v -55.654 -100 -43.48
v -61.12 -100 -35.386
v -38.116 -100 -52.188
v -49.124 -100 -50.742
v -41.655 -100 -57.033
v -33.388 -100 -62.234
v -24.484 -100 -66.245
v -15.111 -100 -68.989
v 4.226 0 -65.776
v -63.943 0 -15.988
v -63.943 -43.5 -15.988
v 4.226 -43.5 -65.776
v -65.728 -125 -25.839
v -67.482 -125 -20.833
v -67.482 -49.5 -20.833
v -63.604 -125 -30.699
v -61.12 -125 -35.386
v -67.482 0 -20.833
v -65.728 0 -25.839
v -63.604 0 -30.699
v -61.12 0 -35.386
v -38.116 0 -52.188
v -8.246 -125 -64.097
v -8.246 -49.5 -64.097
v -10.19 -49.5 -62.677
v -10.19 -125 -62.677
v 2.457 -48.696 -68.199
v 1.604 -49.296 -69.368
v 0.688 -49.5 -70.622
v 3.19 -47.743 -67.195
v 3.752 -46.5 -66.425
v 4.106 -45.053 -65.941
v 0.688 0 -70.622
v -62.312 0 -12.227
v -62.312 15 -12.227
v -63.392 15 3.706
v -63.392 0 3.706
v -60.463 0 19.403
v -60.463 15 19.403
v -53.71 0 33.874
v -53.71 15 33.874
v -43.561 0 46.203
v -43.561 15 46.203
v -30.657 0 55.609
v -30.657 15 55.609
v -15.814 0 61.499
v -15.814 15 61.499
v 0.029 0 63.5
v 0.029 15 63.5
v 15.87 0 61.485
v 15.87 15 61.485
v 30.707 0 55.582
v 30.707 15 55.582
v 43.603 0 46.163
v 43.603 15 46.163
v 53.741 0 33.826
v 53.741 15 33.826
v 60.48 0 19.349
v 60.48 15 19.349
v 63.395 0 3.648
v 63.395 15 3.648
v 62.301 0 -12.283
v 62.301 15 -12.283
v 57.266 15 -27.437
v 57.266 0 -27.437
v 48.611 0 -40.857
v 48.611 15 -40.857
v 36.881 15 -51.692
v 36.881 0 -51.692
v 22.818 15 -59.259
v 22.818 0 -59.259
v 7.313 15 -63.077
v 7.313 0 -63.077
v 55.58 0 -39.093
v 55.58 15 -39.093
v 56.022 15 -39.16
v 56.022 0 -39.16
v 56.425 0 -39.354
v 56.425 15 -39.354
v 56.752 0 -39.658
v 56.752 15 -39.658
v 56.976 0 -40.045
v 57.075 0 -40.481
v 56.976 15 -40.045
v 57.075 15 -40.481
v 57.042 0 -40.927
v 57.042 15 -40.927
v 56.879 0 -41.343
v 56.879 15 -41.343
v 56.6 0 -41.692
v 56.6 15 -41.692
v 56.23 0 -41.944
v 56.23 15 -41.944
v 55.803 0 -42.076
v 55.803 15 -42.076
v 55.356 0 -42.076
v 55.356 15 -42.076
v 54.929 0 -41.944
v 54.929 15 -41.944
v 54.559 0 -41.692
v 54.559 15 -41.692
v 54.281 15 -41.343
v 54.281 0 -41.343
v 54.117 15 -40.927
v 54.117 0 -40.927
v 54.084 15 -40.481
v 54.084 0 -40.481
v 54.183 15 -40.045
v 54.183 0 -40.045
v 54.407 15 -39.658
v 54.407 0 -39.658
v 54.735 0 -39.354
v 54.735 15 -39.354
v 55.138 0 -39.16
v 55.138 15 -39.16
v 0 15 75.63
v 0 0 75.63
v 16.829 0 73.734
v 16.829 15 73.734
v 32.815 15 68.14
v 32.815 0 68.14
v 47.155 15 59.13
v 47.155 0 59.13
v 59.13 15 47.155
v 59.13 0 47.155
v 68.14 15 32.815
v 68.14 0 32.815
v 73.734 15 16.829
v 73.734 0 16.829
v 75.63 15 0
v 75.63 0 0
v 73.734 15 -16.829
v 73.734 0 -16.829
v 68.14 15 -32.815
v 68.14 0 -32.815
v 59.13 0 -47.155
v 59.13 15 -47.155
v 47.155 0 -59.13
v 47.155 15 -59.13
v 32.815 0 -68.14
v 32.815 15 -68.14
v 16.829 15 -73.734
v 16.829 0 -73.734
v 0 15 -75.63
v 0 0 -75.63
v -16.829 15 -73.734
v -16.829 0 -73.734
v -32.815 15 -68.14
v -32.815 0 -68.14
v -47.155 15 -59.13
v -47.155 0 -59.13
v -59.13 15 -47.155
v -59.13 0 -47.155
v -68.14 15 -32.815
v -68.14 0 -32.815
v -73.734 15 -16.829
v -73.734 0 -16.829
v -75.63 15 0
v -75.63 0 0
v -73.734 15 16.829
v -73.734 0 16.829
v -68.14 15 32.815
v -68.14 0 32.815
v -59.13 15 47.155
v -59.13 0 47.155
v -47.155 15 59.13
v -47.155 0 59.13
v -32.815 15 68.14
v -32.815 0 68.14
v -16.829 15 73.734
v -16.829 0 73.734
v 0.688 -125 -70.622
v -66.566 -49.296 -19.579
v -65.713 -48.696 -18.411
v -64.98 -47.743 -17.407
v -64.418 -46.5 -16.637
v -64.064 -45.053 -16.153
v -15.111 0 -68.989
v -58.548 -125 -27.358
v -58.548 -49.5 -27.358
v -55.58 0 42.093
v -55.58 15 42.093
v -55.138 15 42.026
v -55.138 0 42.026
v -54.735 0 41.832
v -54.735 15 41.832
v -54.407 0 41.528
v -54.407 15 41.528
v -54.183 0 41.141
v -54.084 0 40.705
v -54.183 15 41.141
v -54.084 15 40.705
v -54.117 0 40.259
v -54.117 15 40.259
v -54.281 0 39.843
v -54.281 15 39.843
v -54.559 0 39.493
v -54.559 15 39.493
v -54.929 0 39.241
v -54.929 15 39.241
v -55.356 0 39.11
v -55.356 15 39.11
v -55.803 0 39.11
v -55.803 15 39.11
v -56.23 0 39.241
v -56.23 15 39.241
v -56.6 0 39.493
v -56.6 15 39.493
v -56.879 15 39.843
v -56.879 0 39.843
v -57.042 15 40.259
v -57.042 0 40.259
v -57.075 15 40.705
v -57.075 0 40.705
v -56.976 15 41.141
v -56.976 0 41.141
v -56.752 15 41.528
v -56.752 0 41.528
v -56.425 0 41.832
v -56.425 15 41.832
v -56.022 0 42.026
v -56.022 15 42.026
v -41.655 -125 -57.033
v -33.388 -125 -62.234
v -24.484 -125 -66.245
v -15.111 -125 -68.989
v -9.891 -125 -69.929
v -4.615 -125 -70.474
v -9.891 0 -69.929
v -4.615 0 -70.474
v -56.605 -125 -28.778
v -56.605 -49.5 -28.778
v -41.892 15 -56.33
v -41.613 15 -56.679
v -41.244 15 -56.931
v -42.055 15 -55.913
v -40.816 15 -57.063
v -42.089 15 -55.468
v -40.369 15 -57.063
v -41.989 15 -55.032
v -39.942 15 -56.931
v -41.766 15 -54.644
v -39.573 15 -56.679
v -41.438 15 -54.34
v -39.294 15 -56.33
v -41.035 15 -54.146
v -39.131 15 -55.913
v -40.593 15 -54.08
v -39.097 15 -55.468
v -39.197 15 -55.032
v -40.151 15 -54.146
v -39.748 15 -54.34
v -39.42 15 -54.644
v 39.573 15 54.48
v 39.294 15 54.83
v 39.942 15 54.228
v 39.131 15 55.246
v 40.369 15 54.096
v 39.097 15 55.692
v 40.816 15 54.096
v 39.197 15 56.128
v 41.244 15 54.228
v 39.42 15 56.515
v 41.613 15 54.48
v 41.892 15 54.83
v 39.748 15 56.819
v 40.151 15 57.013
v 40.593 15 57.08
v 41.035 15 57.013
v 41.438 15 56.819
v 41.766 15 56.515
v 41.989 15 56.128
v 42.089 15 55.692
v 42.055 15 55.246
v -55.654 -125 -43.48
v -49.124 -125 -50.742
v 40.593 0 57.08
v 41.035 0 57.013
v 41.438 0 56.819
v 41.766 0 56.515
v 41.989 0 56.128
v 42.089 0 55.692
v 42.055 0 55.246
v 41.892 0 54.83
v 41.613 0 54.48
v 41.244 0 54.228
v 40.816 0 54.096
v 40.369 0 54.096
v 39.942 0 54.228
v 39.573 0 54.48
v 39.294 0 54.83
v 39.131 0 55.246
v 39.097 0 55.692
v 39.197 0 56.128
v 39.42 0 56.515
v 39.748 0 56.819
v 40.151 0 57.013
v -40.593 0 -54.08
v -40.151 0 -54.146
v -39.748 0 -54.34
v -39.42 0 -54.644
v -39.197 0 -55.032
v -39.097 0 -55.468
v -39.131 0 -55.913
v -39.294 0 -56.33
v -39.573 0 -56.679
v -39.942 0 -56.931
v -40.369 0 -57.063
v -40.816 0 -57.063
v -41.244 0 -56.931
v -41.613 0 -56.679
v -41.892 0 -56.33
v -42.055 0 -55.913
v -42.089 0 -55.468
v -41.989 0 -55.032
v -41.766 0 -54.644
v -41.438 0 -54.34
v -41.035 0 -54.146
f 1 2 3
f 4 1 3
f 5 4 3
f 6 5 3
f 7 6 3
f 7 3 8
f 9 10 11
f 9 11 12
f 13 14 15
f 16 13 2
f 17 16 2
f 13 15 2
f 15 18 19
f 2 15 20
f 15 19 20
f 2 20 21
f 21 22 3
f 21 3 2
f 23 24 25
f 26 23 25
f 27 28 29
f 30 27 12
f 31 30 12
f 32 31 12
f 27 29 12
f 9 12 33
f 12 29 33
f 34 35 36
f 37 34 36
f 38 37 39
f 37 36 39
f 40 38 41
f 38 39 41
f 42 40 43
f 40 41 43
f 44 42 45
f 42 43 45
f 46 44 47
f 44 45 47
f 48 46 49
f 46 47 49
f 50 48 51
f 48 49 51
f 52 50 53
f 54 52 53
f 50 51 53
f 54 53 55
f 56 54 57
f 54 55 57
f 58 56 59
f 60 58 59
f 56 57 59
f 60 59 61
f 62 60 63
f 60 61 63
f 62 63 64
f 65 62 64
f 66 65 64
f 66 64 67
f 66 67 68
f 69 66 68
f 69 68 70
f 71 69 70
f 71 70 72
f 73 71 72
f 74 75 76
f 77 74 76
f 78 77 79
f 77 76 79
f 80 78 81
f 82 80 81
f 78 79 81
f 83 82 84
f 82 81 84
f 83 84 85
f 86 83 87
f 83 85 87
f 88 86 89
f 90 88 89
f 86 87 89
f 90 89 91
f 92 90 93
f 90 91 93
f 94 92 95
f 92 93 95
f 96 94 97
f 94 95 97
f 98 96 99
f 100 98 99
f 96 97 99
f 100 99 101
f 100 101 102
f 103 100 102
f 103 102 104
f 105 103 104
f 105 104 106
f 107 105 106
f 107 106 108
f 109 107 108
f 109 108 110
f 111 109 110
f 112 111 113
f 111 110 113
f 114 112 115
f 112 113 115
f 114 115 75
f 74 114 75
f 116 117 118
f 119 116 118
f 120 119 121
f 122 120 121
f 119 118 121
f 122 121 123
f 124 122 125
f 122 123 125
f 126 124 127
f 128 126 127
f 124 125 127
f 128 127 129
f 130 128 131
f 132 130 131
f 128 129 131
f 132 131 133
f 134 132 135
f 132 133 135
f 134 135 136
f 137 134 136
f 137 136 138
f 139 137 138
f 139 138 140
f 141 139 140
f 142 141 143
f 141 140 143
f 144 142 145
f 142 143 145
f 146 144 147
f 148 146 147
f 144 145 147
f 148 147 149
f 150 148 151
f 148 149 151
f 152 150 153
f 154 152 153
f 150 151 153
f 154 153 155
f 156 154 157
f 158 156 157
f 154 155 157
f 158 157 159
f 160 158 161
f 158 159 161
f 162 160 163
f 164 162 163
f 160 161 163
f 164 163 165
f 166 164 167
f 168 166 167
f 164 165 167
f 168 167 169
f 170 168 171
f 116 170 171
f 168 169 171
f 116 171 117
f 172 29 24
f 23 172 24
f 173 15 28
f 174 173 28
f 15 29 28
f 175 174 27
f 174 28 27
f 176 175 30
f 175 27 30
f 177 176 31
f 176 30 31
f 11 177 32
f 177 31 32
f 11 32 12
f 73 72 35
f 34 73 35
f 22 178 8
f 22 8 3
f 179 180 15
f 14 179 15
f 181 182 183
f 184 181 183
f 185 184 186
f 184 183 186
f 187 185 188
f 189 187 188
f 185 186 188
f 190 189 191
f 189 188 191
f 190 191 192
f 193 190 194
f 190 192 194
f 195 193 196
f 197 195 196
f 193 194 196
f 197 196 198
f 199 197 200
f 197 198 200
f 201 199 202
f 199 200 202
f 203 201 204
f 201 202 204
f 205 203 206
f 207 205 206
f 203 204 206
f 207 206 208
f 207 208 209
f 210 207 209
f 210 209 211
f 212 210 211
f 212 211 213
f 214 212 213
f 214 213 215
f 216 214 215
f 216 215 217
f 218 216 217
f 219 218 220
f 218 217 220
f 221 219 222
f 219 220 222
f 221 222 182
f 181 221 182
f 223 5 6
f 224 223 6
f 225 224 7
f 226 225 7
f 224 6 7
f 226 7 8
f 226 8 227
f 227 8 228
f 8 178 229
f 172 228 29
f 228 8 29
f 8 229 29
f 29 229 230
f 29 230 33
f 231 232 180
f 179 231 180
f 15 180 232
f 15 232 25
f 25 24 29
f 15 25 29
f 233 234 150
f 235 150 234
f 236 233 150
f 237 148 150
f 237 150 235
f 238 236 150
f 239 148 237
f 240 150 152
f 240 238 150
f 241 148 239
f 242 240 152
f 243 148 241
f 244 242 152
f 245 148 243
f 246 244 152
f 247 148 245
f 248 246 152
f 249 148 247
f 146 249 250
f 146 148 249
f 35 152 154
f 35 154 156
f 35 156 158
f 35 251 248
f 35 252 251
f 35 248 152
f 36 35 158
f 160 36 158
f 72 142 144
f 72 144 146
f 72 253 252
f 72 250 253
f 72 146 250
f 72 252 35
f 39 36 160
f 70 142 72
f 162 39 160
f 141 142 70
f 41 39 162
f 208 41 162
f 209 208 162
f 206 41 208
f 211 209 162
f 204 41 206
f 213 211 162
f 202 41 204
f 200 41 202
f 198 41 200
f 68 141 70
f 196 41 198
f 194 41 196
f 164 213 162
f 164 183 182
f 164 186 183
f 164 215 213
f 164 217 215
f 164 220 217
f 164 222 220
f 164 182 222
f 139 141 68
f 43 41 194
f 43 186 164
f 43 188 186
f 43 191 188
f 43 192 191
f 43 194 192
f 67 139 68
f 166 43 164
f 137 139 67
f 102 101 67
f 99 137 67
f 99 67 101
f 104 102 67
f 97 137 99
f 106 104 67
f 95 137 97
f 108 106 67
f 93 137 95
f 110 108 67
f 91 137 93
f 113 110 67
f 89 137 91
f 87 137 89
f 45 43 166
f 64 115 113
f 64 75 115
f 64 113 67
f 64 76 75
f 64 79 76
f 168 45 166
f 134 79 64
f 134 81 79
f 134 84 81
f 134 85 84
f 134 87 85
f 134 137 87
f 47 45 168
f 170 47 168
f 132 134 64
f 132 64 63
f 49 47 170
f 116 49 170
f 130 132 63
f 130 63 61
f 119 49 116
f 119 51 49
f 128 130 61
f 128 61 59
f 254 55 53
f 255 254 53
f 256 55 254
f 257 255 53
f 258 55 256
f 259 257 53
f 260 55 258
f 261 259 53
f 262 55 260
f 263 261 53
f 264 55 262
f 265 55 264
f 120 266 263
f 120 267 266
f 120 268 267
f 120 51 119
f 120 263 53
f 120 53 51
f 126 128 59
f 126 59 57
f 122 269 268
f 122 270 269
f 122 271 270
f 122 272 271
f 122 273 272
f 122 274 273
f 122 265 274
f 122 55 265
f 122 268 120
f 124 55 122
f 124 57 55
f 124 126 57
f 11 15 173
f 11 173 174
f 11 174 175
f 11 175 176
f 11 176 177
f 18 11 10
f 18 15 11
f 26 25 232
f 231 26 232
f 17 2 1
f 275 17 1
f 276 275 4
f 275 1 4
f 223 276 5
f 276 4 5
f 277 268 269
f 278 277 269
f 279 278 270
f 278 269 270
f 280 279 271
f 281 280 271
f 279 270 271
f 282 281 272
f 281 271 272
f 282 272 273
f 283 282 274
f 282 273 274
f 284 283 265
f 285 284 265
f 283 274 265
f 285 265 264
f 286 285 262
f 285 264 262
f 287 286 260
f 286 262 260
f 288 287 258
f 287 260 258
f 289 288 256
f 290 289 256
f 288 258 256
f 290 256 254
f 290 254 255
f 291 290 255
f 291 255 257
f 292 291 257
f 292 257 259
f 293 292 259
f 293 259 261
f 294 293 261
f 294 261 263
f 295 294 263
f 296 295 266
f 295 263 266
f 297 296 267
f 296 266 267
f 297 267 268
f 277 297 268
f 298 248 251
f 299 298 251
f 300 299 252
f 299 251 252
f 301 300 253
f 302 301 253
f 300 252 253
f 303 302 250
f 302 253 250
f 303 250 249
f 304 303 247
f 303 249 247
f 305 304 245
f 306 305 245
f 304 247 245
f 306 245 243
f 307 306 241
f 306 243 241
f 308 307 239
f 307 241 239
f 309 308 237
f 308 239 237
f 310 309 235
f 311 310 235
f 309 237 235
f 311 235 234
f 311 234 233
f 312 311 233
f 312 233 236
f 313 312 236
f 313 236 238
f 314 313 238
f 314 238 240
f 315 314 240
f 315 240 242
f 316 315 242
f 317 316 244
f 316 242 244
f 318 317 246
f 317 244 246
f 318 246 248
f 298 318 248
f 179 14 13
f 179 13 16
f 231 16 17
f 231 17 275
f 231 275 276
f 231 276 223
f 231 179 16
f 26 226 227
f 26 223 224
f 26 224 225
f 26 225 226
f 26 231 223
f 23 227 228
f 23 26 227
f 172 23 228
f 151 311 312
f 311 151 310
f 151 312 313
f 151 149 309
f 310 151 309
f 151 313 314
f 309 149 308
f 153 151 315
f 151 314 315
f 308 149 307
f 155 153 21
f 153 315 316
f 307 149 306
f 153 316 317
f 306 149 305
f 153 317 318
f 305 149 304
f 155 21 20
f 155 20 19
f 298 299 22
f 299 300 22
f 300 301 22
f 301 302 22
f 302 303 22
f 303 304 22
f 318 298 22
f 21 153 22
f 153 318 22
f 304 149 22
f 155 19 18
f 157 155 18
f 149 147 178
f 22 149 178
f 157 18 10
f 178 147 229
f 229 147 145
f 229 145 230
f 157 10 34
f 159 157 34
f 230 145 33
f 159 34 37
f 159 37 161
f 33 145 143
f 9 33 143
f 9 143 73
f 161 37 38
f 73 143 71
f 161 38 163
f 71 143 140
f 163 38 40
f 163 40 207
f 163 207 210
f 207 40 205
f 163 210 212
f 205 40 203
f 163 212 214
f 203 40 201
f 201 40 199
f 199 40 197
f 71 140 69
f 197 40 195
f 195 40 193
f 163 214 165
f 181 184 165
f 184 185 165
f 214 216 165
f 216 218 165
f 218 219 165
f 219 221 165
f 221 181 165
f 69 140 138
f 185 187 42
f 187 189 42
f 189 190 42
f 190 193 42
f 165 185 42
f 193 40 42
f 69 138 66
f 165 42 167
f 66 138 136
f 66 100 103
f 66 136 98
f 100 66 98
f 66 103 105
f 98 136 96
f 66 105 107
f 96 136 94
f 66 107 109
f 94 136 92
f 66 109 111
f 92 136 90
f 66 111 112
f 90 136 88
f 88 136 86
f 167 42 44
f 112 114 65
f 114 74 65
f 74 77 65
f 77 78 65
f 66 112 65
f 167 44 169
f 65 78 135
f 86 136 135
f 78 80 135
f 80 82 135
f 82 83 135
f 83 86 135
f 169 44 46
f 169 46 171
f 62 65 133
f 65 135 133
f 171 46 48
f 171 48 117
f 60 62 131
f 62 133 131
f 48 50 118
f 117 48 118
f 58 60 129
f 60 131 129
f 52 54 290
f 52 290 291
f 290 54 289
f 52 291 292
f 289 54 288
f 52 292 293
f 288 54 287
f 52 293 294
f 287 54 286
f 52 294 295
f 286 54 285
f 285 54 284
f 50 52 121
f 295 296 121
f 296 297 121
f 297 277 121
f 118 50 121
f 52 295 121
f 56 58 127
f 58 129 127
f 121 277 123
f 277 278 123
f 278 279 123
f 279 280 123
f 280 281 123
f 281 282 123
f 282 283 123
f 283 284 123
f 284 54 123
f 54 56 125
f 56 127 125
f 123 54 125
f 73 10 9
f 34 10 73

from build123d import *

# Parameters (mm, degrees)
SKETCH2_R           = 75.63
BOSS_EXTRUDE1_DEPTH = 15
SKETCH5_R           = 63.5
CUT_EXTRUDE1_DEPTH  = 109.003674937
BOSS_EXTRUDE2_START = -15
BOSS_EXTRUDE2_DEPTH = 15
BOSS_EXTRUDE3_DEPTH = 125
CUT_EXTRUDE4_DEPTH  = 100
SKETCH7_R           = 1.5
CUT_EXTRUDE2_DEPTH  = 15
SKETCH8_W           = 84.415638362
SKETCH8_H           = 49.5
BOSS_EXTRUDE4_DEPTH = 6
FILLET1_R           = 6


with BuildPart() as part:
    # Sketch2 → Boss-Extrude1 (new body)
    with BuildSketch(Plane(origin=(0, 0, 0), x_dir=(1, 0, 0), z_dir=(0, 1, 0))):
        with Locations(Location((0, 0, 0), (0, 0, 270))):
            Circle(SKETCH2_R)
    extrude(amount=BOSS_EXTRUDE1_DEPTH)

    # Sketch5 → Cut-Extrude1 (cut, through all)
    with BuildSketch(Plane(origin=(0, 15, 0), x_dir=(1, 0, 0), z_dir=(0, 1, 0))):
        with Locations(Location((0, 0, 0), (0, 0, 270))):
            Circle(SKETCH5_R)
    extrude(amount=-CUT_EXTRUDE1_DEPTH, mode=Mode.SUBTRACT)

    # Sketch6 → Boss-Extrude2 (add)
    with BuildSketch(Plane.XZ.offset(BOSS_EXTRUDE2_START)):
        with BuildLine():
            Line((7.313069509, -63.077484211), (-62.311802931, -12.226578243))
            ThreePointArc((-62.311802931, -12.226578243), (-37.452220614, -51.279441993), (7.313069509, -63.077484211))
        make_face()
    extrude(amount=BOSS_EXTRUDE2_DEPTH)

    # Sketch6<5> → Boss-Extrude3 (add)
    with BuildSketch(Plane.XZ):
        with BuildLine():
            Line((-8.246344057, -64.096711575), (-10.190161052, -62.677034213))
            ThreePointArc((-10.190161052, -62.677034213), (-37.452220614, -51.279441993), (-56.604547366, -28.778033593))
            Line((-56.604547366, -28.778033593), (-58.548364361, -27.358356231))
            ThreePointArc((-58.548364361, -27.358356231), (-49.90104688, -41.064292825), (-38.115744208, -52.187936044))
            ThreePointArc((-38.115744208, -52.187936044), (-23.933565149, -60.029784976), (-8.246344057, -64.096711575))
        make_face()
        with BuildLine():
            Line((0.687581465, -70.621652889), (-8.246344057, -64.096711575))
            ThreePointArc((-8.246344057, -64.096711575), (-23.933565149, -60.029784976), (-38.115744208, -52.187936044))
            Line((-38.115744208, -52.187936044), (-15.111189696, -68.989438112))
            ThreePointArc((-15.111189696, -68.989438112), (-7.25783369, -70.251081665), (0.687581465, -70.621652889))
        make_face()
        with BuildLine():
            Line((-61.120298719, -35.386433976), (-38.115744208, -52.187936044))
            ThreePointArc((-38.115744208, -52.187936044), (-49.90104688, -41.064292825), (-58.548364361, -27.358356231))
            Line((-58.548364361, -27.358356231), (-67.482289883, -20.833414917))
            ThreePointArc((-67.482289883, -20.833414917), (-64.711699404, -28.289336954), (-61.120298719, -35.386433976))
        make_face()
        with BuildLine():
            Line((-15.111189696, -68.989438112), (-38.115744208, -52.187936044))
            Line((-38.115744208, -52.187936044), (-41.654536706, -57.033237649))
            ThreePointArc((-41.654536706, -57.033237649), (-29.005596113, -64.393835257), (-15.111189696, -68.989438112))
        make_face()
        with BuildLine():
            Line((-41.654536706, -57.033237649), (-38.115744208, -52.187936044))
            Line((-38.115744208, -52.187936044), (-61.120298719, -35.386433976))
            ThreePointArc((-61.120298719, -35.386433976), (-52.514881, -47.223700602), (-41.654536706, -57.033237649))
        make_face()
        with BuildLine():
            ThreePointArc((-56.604547366, -28.778033593), (-37.452220614, -51.279441993), (-10.190161052, -62.677034213))
            Line((-10.190161052, -62.677034213), (-33.397354209, -45.727533903))
            Line((-33.397354209, -45.727533903), (-56.604547366, -28.778033593))
        make_face()
    extrude(amount=BOSS_EXTRUDE3_DEPTH)

    # Sketch6<14> → Cut-Extrude4 (cut)
    with BuildSketch(Plane.XZ):
        with BuildLine():
            Line((-15.111189696, -68.989438112), (-38.115744208, -52.187936044))
            Line((-38.115744208, -52.187936044), (-41.654536706, -57.033237649))
            ThreePointArc((-41.654536706, -57.033237649), (-29.005596113, -64.393835257), (-15.111189696, -68.989438112))
        make_face()
        with BuildLine():
            Line((-41.654536706, -57.033237649), (-38.115744208, -52.187936044))
            Line((-38.115744208, -52.187936044), (-61.120298719, -35.386433976))
            ThreePointArc((-61.120298719, -35.386433976), (-52.514881, -47.223700602), (-41.654536706, -57.033237649))
        make_face()
    extrude(amount=CUT_EXTRUDE4_DEPTH, mode=Mode.SUBTRACT)

    # Sketch7 → Cut-Extrude2 (cut)
    with BuildSketch(Plane(origin=(0, 15, 0), x_dir=(1, 0, 0), z_dir=(0, 1, 0))):
        with Locations(Location((40.592898957, -55.579647168, 0), (0, 0, 270))):
            Circle(SKETCH7_R)
        with Locations(Location((-55.579647168, -40.592898957, 0), (0, 0, 270))):
            Circle(SKETCH7_R)
        with Locations(Location((-40.592898957, 55.579647168, 0), (0, 0, 270))):
            Circle(SKETCH7_R)
        with Locations(Location((55.579647168, 40.592898957, 0), (0, 0, 270))):
            Circle(SKETCH7_R)
    extrude(amount=-CUT_EXTRUDE2_DEPTH, mode=Mode.SUBTRACT)

    # Sketch8 → Boss-Extrude4 (add)
    with BuildSketch(Plane(origin=(-33.397354209, 0, -45.727533903), x_dir=(0.8075502676015422, 0, -0.5897987498263095), z_dir=(0.5897987498263095, 0, 0.8075502676015424))):
        with Locations((0, -24.75)):
            Rectangle(SKETCH8_W, SKETCH8_H)
    extrude(amount=BOSS_EXTRUDE4_DEPTH)

    # Fillet1
    fillet1_edges = [part.edges().sort_by_distance(p)[0] for p in [
        (-29.85856171, -49.5, -40.882232297),
    ]]
    fillet(fillet1_edges, radius=FILLET1_R - 0.0001)  # a hair under: the kernel refuses the full size


solid = part.part
